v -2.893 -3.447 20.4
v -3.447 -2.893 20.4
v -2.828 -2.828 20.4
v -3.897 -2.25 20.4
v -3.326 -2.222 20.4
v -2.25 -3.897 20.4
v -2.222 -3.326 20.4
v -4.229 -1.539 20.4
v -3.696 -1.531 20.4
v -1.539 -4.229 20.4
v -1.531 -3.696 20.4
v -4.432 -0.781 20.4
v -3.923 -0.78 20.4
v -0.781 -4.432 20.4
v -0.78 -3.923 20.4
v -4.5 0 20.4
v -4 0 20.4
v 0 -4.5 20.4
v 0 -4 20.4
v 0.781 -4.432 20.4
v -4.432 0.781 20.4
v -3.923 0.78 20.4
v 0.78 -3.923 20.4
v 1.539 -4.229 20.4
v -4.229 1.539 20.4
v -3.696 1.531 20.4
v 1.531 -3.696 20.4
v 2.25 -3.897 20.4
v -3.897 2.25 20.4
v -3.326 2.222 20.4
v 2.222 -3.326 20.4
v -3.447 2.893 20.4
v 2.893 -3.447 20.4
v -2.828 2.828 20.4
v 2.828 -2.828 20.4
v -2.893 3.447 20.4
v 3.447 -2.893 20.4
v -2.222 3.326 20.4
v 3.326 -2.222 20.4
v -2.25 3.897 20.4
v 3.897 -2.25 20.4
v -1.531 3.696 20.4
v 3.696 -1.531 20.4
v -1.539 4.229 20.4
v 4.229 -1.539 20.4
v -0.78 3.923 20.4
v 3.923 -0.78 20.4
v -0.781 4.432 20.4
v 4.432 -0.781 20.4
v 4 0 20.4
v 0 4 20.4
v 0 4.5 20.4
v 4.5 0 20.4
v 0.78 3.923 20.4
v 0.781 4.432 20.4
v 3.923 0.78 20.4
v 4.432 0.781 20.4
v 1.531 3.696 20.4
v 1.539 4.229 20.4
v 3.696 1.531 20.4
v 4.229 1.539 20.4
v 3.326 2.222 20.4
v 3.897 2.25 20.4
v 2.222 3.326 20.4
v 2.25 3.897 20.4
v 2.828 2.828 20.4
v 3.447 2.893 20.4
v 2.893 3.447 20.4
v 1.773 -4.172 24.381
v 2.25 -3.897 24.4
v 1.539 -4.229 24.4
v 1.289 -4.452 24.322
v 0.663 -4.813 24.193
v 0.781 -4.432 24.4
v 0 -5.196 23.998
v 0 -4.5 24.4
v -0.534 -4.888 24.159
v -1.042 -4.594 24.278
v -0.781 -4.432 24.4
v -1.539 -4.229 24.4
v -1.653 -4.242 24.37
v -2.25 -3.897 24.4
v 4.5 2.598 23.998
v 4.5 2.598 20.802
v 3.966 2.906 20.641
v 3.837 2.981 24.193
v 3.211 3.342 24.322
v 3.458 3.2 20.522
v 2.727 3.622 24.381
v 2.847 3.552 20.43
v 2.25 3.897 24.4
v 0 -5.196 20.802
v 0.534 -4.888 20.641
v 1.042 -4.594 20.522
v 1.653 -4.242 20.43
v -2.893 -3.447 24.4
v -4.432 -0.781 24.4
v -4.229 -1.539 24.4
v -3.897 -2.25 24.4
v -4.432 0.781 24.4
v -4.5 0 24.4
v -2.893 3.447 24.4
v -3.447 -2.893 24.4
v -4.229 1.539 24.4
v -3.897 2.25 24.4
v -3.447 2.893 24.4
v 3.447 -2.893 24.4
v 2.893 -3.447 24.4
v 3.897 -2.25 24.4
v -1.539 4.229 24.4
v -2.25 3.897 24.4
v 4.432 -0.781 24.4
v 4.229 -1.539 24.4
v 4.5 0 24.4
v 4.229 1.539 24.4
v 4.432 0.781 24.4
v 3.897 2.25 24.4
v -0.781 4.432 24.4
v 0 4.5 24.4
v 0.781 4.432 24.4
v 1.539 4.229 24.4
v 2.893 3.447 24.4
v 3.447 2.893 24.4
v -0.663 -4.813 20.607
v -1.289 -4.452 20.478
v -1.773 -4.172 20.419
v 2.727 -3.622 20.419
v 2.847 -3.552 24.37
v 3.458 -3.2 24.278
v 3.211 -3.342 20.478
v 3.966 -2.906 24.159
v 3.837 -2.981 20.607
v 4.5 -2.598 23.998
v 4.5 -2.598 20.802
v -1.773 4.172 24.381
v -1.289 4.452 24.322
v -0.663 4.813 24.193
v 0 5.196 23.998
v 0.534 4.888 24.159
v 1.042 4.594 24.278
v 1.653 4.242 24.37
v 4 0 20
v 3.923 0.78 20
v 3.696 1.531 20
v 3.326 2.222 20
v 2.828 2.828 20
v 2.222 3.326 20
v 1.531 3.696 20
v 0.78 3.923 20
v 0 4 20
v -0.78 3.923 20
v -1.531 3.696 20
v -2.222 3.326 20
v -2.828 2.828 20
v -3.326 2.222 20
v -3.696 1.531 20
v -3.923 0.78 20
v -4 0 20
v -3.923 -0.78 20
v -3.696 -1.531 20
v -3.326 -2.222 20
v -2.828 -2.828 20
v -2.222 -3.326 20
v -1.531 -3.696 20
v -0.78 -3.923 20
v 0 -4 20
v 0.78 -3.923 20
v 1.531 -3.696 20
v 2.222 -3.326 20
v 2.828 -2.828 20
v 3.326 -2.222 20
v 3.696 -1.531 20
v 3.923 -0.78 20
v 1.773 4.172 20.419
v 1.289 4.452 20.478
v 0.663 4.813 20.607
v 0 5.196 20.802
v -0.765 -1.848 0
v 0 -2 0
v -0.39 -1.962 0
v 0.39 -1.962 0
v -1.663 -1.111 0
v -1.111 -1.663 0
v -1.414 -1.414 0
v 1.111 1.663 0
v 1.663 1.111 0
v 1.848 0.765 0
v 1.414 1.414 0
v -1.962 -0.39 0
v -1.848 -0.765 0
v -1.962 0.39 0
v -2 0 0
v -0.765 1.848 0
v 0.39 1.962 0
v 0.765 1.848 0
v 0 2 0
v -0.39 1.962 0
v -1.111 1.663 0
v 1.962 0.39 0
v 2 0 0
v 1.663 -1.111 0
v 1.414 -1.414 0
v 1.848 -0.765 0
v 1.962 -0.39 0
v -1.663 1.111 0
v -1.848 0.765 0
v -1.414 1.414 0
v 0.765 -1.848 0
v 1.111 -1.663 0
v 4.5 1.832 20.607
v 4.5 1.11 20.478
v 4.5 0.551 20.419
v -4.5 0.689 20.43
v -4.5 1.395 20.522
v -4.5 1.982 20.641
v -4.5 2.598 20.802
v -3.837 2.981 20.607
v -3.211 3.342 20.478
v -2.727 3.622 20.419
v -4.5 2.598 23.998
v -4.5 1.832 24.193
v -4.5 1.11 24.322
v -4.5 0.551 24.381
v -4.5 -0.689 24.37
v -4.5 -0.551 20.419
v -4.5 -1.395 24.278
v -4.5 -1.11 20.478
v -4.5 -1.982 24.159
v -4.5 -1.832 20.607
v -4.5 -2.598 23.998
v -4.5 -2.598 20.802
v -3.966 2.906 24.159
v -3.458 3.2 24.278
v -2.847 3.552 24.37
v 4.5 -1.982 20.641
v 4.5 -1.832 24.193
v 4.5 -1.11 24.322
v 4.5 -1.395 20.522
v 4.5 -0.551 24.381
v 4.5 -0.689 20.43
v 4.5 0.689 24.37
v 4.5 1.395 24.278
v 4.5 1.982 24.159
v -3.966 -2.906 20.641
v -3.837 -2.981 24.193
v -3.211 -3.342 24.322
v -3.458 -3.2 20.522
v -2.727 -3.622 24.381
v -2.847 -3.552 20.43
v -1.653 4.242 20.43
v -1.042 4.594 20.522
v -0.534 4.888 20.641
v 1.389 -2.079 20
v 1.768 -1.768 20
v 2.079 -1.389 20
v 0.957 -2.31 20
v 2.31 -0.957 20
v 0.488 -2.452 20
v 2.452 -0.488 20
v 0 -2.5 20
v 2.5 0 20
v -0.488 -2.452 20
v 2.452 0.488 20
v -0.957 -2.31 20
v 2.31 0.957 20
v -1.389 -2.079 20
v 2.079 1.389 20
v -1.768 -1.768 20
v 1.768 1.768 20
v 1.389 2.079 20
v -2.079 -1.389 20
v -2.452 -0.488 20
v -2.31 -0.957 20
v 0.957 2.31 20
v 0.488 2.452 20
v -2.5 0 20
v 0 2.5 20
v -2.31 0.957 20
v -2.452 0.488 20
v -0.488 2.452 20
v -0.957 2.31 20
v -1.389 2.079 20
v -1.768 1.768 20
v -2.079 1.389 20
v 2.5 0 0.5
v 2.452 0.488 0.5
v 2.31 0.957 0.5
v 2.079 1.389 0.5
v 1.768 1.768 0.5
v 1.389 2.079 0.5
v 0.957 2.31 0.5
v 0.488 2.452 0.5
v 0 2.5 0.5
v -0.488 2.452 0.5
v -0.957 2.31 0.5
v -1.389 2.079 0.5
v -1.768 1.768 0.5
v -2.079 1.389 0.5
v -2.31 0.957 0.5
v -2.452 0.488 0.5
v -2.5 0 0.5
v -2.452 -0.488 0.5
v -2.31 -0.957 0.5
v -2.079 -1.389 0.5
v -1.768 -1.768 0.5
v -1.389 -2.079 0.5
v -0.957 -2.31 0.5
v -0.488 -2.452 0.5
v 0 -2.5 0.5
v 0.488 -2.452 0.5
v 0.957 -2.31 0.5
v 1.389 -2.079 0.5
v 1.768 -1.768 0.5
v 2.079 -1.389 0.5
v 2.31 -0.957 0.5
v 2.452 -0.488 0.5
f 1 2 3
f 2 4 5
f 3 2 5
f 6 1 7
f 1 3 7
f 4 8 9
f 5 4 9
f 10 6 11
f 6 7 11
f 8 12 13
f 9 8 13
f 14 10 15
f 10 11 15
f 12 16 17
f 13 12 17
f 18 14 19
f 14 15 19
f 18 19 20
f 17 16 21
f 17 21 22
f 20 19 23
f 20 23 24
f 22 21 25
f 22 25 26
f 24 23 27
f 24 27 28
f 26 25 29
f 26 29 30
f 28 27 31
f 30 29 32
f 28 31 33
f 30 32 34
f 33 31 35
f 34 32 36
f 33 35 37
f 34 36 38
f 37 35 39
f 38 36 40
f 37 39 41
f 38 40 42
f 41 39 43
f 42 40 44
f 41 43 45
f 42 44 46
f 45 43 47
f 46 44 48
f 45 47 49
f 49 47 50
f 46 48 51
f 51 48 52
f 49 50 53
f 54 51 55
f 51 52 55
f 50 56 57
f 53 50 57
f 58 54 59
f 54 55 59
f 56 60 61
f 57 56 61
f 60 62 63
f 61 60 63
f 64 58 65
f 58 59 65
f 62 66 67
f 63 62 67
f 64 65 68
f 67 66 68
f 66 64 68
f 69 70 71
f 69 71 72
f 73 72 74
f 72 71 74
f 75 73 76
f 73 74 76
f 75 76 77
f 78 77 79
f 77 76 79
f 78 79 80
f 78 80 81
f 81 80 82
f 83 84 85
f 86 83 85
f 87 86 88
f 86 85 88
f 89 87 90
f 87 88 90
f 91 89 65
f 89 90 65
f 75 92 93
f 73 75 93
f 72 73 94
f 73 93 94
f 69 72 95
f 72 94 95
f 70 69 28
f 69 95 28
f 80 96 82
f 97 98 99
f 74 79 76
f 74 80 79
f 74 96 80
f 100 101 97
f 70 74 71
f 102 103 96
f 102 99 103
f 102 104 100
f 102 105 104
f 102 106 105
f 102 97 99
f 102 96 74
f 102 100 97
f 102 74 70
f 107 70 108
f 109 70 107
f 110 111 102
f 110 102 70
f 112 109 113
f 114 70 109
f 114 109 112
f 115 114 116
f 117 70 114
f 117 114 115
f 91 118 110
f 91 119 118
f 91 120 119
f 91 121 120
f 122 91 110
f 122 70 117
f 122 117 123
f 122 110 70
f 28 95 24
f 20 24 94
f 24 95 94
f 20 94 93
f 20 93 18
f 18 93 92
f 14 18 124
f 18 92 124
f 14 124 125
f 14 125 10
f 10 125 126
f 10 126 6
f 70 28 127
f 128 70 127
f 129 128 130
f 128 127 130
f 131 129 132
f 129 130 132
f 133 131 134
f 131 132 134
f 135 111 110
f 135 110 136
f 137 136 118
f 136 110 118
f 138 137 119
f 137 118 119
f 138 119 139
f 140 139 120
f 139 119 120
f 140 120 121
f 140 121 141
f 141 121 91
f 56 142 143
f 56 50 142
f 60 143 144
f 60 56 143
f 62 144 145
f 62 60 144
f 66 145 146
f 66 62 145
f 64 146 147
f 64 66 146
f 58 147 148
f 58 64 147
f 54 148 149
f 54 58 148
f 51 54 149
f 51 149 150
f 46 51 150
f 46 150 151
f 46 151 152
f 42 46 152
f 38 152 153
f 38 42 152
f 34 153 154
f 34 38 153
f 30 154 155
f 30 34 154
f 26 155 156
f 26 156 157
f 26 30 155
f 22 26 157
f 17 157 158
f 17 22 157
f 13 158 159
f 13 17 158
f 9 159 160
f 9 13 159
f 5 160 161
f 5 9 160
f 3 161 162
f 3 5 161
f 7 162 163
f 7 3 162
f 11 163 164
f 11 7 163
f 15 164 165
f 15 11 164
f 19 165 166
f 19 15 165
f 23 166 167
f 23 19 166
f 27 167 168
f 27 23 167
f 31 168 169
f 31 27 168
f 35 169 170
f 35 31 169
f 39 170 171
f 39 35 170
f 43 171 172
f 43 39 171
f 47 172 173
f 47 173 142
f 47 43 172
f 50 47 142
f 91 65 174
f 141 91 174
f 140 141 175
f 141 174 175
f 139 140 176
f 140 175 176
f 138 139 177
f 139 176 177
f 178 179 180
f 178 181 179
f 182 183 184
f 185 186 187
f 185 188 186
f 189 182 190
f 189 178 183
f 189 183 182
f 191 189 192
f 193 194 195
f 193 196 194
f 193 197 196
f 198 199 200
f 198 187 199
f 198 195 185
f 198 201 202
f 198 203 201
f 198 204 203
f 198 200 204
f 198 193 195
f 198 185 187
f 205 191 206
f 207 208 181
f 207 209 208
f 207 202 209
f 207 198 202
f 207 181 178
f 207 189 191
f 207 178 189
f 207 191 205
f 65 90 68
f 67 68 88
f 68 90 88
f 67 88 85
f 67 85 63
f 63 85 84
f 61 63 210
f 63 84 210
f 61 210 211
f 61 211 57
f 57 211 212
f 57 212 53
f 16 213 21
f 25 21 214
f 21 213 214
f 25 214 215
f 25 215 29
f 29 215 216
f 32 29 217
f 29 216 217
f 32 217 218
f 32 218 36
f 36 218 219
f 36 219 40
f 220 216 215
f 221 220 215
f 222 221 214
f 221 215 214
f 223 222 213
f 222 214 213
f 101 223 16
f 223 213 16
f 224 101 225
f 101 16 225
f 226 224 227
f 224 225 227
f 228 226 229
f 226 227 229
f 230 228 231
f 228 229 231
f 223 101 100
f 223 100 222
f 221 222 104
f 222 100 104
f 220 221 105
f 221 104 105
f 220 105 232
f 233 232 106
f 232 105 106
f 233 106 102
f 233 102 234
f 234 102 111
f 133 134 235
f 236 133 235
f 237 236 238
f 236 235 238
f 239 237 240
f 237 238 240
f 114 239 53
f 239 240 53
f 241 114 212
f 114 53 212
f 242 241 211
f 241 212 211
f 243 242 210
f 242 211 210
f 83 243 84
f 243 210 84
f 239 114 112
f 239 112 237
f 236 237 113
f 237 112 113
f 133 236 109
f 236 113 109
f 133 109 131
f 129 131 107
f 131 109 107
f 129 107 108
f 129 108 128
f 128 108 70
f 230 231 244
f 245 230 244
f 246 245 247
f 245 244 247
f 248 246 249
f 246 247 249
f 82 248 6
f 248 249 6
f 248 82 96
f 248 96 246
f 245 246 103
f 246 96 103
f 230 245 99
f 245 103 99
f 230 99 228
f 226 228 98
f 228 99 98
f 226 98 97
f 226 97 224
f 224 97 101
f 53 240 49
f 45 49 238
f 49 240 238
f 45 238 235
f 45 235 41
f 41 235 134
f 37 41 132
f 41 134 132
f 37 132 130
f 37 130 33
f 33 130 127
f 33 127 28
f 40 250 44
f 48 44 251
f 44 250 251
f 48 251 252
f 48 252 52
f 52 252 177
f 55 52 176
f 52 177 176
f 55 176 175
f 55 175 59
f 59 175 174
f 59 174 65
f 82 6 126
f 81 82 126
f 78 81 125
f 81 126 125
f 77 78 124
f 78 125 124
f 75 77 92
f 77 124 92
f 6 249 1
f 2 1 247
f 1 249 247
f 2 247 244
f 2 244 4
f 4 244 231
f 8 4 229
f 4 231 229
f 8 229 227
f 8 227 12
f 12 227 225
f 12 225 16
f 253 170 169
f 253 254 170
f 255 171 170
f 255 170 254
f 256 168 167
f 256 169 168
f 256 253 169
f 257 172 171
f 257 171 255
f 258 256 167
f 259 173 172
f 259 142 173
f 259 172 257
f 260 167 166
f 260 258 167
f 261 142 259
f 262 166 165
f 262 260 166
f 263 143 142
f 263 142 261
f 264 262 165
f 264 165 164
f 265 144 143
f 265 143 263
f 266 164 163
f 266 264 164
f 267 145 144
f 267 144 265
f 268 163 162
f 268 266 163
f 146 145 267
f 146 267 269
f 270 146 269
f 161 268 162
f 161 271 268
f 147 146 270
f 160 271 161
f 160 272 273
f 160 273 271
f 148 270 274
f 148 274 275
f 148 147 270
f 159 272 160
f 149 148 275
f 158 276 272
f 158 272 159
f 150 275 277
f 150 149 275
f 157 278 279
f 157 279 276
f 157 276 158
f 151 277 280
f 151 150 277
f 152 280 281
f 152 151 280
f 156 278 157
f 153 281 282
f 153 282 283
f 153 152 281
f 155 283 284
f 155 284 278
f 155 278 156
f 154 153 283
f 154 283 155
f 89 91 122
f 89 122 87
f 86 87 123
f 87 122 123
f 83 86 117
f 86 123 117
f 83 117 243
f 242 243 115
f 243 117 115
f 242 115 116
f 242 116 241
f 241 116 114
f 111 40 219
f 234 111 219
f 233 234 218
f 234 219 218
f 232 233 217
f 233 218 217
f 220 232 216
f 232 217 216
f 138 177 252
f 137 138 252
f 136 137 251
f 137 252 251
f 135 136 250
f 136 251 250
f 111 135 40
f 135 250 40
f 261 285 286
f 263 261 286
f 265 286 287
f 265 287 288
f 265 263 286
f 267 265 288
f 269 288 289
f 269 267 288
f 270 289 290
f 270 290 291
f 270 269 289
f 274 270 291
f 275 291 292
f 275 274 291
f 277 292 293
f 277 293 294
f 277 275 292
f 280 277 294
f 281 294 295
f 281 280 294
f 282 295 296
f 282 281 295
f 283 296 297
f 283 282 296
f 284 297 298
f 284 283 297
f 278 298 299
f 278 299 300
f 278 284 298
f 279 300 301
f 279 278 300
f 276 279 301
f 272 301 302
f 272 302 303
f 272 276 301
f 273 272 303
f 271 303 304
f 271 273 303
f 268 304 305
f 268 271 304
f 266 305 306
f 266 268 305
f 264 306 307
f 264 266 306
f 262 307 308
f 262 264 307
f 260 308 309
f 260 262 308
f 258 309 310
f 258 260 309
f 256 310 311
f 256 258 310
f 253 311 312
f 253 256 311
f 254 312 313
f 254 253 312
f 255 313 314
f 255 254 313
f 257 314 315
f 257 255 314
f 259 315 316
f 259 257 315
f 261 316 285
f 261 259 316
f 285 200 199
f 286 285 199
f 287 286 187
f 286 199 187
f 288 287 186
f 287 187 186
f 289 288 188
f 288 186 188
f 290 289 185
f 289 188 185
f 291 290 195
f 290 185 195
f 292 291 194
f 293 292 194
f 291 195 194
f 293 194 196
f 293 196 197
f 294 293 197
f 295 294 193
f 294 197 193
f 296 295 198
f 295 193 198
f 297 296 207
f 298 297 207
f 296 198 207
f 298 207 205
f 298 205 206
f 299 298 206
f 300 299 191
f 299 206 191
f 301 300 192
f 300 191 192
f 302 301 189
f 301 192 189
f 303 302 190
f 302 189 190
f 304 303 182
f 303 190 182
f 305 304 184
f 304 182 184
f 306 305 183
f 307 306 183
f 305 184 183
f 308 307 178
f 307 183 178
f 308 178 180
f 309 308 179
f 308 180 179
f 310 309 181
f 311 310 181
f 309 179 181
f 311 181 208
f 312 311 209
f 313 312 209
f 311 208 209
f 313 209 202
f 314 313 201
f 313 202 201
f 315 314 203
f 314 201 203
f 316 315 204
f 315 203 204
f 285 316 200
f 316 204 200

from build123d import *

# Parameters (mm, degrees)
F3_DEPTH = 4
F6_SIZE  = 0.5


with BuildPart() as f1:
    # F0 (on Front) → F1 (revolve)
    with BuildSketch(Plane.XZ):
        Polygon((0, 20.3999999762), (0, 0), (2.5, 0), (2.5, 20), (4, 20), (4, 20.3999999762), align=None)
    revolve(axis=Axis((0, 0, 10.1999999881), (0, 0, 1)))

    # F2 (on face) → F3 (join)
    with BuildSketch(Plane.XY.offset(20.3999999762)):
        with BuildLine():
            ThreePointArc((2.249999971, -3.8971143338), (3.8971143086, -2.2500000145), (4.5, 0))
            ThreePointArc((4.5, 0), (3.8971143176, 2.249999999), (2.250000002, 3.8971143159))
            ThreePointArc((2.250000002, 3.8971143159), (-2.9e-08, 4.5), (-2.2500000522, 3.8971142869))
            ThreePointArc((-2.2500000522, 3.8971142869), (-3.8971143321, 2.2499999739), (-4.5, 0))
            ThreePointArc((-4.5, 0), (-3.8971143245, -2.2499999871), (-2.2500000257, -3.8971143022))
            ThreePointArc((-2.2500000257, -3.8971143022), (-3.16e-08, -4.5), (2.249999971, -3.8971143338))
        make_face()
        with BuildLine():
            Line((4.5, -2.5980762114), (4.5, 0))
            ThreePointArc((4.5, 0), (3.8971143086, -2.2500000145), (2.249999971, -3.8971143338))
            Line((2.249999971, -3.8971143338), (4.5, -2.5980762114))
        make_face()
        with BuildLine():
            ThreePointArc((2.250000002, 3.8971143159), (3.8971143176, 2.249999999), (4.5, 0))
            Line((4.5, 0), (4.5, 2.5980762114))
            Line((4.5, 2.5980762114), (2.250000002, 3.8971143159))
        make_face()
        with BuildLine():
            ThreePointArc((-2.2500000522, 3.8971142869), (-2.9e-08, 4.5), (2.250000002, 3.8971143159))
            Line((2.250000002, 3.8971143159), (0, 5.1961524227))
            Line((0, 5.1961524227), (-2.2500000522, 3.8971142869))
        make_face()
        with BuildLine():
            Line((0, -5.1961524227), (2.249999971, -3.8971143338))
            ThreePointArc((2.249999971, -3.8971143338), (-3.16e-08, -4.5), (-2.2500000257, -3.8971143022))
            Line((-2.2500000257, -3.8971143022), (0, -5.1961524227))
        make_face()
        with BuildLine():
            ThreePointArc((-4.5, 0), (-3.8971143321, 2.2499999739), (-2.2500000522, 3.8971142869))
            Line((-2.2500000522, 3.8971142869), (-4.5, 2.5980762114))
            Line((-4.5, 2.5980762114), (-4.5, 0))
        make_face()
        with BuildLine():
            Line((-4.5, -2.5980762114), (-2.2500000257, -3.8971143022))
            ThreePointArc((-2.2500000257, -3.8971143022), (-3.8971143245, -2.2499999871), (-4.5, 0))
            Line((-4.5, 0), (-4.5, -2.5980762114))
        make_face()
    extrude(amount=F3_DEPTH)

    # F4 (on Front) → F5 (revolve, cut)
    with BuildSketch(Plane.XZ):
        Polygon((-7.9641016151, 22.3999999762), (-4.5, 24.3999999762), (-9.8750129299, 24.3999999762), (-9.8750129299, 23.5032651381), align=None)
        Polygon((-4.5, 20.3999999762), (-7.9641016151, 22.3999999762), (-9.8750129299, 21.2967348142), (-9.8750129299, 20.3999999762), align=None)
        Polygon((-9.8750129299, 21.2967348142), (-7.9641016151, 22.3999999762), (-9.8750129299, 23.5032651381), align=None)
    revolve(axis=Axis((0, 0, 22.3999999762), (0, 0, -1)), mode=Mode.SUBTRACT)

    # F6
    f6_edges = [f1.edges().sort_by_distance(p)[0] for p in [
        (-2.5, 0, 0),
    ]]
    chamfer(f6_edges, length=F6_SIZE)


solid = f1.part
